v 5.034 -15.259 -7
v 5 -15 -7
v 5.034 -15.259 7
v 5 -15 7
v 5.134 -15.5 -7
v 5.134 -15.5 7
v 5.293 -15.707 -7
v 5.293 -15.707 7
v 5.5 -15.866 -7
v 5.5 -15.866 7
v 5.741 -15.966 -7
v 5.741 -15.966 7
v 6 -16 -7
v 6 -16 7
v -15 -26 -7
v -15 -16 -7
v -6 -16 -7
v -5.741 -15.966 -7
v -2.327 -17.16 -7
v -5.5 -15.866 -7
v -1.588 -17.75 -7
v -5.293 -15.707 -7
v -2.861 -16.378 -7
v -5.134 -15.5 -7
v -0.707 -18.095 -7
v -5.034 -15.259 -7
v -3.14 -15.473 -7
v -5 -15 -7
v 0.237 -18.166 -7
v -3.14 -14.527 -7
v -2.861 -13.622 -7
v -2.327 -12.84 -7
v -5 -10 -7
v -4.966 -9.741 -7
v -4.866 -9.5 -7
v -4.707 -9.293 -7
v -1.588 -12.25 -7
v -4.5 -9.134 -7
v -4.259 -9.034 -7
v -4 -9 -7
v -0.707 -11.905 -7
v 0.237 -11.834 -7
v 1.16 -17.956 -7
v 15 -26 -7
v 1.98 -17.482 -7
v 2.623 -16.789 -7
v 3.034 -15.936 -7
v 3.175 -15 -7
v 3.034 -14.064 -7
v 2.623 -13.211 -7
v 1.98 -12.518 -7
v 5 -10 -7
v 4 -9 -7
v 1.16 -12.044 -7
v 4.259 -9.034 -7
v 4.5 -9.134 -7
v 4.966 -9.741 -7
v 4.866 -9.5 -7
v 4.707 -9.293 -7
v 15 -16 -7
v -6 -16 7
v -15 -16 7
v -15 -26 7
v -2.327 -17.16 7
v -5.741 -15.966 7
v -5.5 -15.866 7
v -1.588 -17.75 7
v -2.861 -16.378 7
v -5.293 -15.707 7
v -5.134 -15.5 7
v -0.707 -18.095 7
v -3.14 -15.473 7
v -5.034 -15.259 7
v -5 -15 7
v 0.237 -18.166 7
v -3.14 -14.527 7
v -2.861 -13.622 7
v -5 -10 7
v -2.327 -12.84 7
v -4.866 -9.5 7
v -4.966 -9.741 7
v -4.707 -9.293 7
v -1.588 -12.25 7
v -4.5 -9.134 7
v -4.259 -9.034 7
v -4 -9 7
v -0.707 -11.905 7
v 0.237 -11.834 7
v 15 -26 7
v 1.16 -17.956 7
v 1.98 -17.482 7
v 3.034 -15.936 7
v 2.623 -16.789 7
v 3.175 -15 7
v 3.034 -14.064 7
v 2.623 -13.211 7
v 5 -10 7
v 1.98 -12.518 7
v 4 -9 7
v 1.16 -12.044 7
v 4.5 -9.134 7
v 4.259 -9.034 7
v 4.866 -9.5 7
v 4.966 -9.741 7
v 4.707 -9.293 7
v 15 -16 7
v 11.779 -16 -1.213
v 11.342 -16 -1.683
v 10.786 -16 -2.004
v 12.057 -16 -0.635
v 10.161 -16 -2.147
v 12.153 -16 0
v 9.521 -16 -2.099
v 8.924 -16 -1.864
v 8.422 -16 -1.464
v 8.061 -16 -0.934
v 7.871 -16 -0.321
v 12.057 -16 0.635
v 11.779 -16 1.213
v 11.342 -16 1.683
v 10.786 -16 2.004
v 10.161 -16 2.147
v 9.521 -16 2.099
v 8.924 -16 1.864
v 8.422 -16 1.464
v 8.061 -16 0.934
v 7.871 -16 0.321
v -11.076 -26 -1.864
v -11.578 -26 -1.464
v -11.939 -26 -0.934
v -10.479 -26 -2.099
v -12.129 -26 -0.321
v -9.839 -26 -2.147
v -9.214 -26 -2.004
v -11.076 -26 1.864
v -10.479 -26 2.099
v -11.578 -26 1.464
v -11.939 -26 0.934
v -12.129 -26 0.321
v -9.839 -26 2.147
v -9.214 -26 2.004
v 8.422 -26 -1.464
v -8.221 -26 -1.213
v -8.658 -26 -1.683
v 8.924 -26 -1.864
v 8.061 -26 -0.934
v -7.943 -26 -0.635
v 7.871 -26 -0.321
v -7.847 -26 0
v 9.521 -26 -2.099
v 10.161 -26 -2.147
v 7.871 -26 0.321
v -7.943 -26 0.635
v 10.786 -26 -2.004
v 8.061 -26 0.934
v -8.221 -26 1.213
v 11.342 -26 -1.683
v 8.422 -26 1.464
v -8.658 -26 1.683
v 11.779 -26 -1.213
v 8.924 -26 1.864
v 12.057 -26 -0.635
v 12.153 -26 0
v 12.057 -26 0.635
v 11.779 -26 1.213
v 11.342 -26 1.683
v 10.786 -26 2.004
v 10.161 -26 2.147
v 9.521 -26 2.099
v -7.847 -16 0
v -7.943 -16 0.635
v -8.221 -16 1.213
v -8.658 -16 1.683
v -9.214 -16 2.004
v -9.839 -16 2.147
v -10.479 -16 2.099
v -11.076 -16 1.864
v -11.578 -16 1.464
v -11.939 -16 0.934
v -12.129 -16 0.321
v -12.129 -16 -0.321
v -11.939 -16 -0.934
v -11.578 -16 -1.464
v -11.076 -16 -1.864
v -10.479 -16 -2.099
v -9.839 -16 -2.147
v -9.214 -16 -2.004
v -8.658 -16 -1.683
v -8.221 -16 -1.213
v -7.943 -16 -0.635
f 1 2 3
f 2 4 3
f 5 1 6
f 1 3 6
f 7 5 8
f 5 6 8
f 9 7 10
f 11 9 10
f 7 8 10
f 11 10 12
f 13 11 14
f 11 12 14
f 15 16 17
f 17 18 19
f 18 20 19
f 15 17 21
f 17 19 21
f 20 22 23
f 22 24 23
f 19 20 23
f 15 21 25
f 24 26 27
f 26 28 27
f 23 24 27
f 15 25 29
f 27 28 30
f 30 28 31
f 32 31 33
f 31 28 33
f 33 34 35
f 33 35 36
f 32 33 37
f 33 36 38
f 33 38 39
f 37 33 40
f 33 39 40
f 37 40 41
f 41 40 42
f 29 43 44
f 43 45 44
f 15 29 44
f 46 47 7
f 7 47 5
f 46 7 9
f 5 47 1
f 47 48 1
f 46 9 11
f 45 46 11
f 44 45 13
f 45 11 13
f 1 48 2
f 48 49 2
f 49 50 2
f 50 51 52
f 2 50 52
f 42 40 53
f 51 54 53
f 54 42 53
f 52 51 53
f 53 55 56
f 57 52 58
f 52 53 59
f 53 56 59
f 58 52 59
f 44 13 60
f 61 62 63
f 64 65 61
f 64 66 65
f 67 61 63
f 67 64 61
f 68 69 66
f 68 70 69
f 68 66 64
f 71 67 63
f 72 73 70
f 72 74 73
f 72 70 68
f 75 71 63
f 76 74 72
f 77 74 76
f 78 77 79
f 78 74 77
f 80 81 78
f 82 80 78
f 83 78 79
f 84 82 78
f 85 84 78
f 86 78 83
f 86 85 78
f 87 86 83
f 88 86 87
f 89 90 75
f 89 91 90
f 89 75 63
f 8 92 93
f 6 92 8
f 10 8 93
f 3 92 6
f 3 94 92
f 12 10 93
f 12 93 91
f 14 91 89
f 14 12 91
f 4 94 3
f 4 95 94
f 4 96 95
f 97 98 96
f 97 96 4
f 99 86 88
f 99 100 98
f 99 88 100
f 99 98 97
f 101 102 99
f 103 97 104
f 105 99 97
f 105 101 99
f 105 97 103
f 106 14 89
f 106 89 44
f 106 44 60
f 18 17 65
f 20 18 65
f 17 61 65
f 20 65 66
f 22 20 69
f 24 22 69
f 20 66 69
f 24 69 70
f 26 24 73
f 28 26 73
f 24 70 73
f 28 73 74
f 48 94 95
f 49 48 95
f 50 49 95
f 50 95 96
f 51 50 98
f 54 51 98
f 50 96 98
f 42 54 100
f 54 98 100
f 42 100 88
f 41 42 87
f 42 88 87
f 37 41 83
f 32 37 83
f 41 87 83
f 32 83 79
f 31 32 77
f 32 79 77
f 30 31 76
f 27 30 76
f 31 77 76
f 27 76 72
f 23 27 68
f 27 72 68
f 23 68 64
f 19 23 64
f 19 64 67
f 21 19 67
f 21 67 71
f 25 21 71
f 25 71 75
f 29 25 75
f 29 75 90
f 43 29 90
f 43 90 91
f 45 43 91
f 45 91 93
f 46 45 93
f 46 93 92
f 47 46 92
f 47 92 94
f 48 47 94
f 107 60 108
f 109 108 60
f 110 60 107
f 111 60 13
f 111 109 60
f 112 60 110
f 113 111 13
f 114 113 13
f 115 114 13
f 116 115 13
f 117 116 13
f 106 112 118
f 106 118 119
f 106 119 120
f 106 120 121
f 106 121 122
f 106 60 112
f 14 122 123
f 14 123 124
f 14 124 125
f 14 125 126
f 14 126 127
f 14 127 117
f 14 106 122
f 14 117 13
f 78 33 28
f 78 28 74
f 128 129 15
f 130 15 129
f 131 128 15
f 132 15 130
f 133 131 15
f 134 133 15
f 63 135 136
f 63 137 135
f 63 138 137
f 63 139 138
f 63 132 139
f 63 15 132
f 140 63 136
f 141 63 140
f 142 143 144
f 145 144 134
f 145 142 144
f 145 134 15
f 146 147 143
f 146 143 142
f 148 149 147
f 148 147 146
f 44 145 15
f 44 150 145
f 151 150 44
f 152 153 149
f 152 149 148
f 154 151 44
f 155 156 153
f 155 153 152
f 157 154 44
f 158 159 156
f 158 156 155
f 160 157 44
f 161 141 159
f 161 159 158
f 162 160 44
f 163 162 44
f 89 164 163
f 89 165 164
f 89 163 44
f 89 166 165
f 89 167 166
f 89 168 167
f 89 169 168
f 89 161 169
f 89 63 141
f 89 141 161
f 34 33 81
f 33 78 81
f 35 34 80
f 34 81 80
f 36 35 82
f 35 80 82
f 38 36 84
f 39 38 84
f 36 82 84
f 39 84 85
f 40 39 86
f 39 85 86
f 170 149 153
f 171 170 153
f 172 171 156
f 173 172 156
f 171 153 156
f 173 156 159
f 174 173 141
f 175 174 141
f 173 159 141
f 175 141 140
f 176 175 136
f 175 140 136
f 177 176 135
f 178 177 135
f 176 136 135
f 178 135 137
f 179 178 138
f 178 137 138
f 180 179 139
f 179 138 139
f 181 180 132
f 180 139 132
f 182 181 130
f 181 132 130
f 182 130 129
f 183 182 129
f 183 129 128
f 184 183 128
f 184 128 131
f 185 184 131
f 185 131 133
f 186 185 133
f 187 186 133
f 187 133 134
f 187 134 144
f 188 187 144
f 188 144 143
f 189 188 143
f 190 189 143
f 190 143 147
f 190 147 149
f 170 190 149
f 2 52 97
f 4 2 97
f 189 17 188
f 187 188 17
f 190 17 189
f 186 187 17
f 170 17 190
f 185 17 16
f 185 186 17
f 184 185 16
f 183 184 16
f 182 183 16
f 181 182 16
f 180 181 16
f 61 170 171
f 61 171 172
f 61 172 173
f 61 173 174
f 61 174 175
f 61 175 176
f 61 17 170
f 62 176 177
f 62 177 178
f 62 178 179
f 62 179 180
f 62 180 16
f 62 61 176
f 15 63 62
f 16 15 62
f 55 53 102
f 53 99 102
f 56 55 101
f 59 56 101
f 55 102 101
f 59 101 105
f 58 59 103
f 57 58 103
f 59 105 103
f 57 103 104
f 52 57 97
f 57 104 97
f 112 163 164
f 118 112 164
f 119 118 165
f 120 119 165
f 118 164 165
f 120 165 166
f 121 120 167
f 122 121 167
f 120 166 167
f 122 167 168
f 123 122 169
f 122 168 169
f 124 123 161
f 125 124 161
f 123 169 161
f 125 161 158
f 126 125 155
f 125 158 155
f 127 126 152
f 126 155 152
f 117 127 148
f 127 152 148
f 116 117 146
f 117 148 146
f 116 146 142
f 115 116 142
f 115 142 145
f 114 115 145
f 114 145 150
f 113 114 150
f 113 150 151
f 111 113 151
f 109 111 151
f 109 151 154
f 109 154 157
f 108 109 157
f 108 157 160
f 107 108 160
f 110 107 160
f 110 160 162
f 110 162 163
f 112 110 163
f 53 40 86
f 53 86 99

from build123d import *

# Parameters (mm, degrees)
SKETCH1_W             = 30
SKETCH1_H             = 52
BASE_EXTRUDE_DEPTH    = 7
SKETCH2_W             = 30
SKETCH2_H             = 35
CUT_EXTRUDE1_DEPTH    = 15
SKETCH3_R             = 3.175
CUT_EXTRUDE2_DEPTH    = 15
F_8_CLEARANCE_HOLE1_D = 4.3053
SKETCH6_W             = 10
SKETCH6_H             = 14
CUT_EXTRUDE3_DEPTH    = 7
FILLET1_R             = 1


with BuildPart() as part:
    # Sketch1 → Base-Extrude (new body, symmetric)
    with BuildSketch(Plane.XY):
        Rectangle(SKETCH1_W, SKETCH1_H)
    extrude(amount=BASE_EXTRUDE_DEPTH, both=True)

    # Sketch2 → Cut-Extrude1 (cut, through all)
    with BuildSketch(Plane.XY.offset(7)):
        with Locations((0, 8.5)):
            Rectangle(SKETCH2_W, SKETCH2_H)
    extrude(amount=-CUT_EXTRUDE1_DEPTH, mode=Mode.SUBTRACT)

    # Sketch3 → Cut-Extrude2 (cut, through all)
    with BuildSketch(Plane.XY.offset(7)):
        with Locations((0, -15)):
            Circle(SKETCH3_R)
    extrude(amount=-CUT_EXTRUDE2_DEPTH, mode=Mode.SUBTRACT)

    # #8 Clearance Hole1 (through all)
    with Locations(Plane(origin=(-8.315488936, -9, -4.532476802), x_dir=(-1, 0, 0), z_dir=(0, 1, 0))):
        with Locations((-18.315488936, 4.532476802), (1.684511064, 4.532476802)):
            Hole(F_8_CLEARANCE_HOLE1_D / 2)

    # Sketch6 → Cut-Extrude3 (cut)
    with BuildSketch(Plane(origin=(0, -9, 0), x_dir=(-1, 0, 0), z_dir=(0, 1, 0))):
        with Locations((10, 0)):
            Rectangle(SKETCH6_W, SKETCH6_H)
        with Locations((-10, 0)):
            Rectangle(SKETCH6_W, SKETCH6_H)
    extrude(amount=-CUT_EXTRUDE3_DEPTH, mode=Mode.SUBTRACT)

    # Fillet1
    fillet1_edges = [part.edges().sort_by_distance(p)[0] for p in [
        (-5, -9, 0),
        (-5, -16, 0),
        (5, -9, 0),
        (5, -16, 0),
    ]]
    fillet(fillet1_edges, radius=FILLET1_R)


solid = part.part
